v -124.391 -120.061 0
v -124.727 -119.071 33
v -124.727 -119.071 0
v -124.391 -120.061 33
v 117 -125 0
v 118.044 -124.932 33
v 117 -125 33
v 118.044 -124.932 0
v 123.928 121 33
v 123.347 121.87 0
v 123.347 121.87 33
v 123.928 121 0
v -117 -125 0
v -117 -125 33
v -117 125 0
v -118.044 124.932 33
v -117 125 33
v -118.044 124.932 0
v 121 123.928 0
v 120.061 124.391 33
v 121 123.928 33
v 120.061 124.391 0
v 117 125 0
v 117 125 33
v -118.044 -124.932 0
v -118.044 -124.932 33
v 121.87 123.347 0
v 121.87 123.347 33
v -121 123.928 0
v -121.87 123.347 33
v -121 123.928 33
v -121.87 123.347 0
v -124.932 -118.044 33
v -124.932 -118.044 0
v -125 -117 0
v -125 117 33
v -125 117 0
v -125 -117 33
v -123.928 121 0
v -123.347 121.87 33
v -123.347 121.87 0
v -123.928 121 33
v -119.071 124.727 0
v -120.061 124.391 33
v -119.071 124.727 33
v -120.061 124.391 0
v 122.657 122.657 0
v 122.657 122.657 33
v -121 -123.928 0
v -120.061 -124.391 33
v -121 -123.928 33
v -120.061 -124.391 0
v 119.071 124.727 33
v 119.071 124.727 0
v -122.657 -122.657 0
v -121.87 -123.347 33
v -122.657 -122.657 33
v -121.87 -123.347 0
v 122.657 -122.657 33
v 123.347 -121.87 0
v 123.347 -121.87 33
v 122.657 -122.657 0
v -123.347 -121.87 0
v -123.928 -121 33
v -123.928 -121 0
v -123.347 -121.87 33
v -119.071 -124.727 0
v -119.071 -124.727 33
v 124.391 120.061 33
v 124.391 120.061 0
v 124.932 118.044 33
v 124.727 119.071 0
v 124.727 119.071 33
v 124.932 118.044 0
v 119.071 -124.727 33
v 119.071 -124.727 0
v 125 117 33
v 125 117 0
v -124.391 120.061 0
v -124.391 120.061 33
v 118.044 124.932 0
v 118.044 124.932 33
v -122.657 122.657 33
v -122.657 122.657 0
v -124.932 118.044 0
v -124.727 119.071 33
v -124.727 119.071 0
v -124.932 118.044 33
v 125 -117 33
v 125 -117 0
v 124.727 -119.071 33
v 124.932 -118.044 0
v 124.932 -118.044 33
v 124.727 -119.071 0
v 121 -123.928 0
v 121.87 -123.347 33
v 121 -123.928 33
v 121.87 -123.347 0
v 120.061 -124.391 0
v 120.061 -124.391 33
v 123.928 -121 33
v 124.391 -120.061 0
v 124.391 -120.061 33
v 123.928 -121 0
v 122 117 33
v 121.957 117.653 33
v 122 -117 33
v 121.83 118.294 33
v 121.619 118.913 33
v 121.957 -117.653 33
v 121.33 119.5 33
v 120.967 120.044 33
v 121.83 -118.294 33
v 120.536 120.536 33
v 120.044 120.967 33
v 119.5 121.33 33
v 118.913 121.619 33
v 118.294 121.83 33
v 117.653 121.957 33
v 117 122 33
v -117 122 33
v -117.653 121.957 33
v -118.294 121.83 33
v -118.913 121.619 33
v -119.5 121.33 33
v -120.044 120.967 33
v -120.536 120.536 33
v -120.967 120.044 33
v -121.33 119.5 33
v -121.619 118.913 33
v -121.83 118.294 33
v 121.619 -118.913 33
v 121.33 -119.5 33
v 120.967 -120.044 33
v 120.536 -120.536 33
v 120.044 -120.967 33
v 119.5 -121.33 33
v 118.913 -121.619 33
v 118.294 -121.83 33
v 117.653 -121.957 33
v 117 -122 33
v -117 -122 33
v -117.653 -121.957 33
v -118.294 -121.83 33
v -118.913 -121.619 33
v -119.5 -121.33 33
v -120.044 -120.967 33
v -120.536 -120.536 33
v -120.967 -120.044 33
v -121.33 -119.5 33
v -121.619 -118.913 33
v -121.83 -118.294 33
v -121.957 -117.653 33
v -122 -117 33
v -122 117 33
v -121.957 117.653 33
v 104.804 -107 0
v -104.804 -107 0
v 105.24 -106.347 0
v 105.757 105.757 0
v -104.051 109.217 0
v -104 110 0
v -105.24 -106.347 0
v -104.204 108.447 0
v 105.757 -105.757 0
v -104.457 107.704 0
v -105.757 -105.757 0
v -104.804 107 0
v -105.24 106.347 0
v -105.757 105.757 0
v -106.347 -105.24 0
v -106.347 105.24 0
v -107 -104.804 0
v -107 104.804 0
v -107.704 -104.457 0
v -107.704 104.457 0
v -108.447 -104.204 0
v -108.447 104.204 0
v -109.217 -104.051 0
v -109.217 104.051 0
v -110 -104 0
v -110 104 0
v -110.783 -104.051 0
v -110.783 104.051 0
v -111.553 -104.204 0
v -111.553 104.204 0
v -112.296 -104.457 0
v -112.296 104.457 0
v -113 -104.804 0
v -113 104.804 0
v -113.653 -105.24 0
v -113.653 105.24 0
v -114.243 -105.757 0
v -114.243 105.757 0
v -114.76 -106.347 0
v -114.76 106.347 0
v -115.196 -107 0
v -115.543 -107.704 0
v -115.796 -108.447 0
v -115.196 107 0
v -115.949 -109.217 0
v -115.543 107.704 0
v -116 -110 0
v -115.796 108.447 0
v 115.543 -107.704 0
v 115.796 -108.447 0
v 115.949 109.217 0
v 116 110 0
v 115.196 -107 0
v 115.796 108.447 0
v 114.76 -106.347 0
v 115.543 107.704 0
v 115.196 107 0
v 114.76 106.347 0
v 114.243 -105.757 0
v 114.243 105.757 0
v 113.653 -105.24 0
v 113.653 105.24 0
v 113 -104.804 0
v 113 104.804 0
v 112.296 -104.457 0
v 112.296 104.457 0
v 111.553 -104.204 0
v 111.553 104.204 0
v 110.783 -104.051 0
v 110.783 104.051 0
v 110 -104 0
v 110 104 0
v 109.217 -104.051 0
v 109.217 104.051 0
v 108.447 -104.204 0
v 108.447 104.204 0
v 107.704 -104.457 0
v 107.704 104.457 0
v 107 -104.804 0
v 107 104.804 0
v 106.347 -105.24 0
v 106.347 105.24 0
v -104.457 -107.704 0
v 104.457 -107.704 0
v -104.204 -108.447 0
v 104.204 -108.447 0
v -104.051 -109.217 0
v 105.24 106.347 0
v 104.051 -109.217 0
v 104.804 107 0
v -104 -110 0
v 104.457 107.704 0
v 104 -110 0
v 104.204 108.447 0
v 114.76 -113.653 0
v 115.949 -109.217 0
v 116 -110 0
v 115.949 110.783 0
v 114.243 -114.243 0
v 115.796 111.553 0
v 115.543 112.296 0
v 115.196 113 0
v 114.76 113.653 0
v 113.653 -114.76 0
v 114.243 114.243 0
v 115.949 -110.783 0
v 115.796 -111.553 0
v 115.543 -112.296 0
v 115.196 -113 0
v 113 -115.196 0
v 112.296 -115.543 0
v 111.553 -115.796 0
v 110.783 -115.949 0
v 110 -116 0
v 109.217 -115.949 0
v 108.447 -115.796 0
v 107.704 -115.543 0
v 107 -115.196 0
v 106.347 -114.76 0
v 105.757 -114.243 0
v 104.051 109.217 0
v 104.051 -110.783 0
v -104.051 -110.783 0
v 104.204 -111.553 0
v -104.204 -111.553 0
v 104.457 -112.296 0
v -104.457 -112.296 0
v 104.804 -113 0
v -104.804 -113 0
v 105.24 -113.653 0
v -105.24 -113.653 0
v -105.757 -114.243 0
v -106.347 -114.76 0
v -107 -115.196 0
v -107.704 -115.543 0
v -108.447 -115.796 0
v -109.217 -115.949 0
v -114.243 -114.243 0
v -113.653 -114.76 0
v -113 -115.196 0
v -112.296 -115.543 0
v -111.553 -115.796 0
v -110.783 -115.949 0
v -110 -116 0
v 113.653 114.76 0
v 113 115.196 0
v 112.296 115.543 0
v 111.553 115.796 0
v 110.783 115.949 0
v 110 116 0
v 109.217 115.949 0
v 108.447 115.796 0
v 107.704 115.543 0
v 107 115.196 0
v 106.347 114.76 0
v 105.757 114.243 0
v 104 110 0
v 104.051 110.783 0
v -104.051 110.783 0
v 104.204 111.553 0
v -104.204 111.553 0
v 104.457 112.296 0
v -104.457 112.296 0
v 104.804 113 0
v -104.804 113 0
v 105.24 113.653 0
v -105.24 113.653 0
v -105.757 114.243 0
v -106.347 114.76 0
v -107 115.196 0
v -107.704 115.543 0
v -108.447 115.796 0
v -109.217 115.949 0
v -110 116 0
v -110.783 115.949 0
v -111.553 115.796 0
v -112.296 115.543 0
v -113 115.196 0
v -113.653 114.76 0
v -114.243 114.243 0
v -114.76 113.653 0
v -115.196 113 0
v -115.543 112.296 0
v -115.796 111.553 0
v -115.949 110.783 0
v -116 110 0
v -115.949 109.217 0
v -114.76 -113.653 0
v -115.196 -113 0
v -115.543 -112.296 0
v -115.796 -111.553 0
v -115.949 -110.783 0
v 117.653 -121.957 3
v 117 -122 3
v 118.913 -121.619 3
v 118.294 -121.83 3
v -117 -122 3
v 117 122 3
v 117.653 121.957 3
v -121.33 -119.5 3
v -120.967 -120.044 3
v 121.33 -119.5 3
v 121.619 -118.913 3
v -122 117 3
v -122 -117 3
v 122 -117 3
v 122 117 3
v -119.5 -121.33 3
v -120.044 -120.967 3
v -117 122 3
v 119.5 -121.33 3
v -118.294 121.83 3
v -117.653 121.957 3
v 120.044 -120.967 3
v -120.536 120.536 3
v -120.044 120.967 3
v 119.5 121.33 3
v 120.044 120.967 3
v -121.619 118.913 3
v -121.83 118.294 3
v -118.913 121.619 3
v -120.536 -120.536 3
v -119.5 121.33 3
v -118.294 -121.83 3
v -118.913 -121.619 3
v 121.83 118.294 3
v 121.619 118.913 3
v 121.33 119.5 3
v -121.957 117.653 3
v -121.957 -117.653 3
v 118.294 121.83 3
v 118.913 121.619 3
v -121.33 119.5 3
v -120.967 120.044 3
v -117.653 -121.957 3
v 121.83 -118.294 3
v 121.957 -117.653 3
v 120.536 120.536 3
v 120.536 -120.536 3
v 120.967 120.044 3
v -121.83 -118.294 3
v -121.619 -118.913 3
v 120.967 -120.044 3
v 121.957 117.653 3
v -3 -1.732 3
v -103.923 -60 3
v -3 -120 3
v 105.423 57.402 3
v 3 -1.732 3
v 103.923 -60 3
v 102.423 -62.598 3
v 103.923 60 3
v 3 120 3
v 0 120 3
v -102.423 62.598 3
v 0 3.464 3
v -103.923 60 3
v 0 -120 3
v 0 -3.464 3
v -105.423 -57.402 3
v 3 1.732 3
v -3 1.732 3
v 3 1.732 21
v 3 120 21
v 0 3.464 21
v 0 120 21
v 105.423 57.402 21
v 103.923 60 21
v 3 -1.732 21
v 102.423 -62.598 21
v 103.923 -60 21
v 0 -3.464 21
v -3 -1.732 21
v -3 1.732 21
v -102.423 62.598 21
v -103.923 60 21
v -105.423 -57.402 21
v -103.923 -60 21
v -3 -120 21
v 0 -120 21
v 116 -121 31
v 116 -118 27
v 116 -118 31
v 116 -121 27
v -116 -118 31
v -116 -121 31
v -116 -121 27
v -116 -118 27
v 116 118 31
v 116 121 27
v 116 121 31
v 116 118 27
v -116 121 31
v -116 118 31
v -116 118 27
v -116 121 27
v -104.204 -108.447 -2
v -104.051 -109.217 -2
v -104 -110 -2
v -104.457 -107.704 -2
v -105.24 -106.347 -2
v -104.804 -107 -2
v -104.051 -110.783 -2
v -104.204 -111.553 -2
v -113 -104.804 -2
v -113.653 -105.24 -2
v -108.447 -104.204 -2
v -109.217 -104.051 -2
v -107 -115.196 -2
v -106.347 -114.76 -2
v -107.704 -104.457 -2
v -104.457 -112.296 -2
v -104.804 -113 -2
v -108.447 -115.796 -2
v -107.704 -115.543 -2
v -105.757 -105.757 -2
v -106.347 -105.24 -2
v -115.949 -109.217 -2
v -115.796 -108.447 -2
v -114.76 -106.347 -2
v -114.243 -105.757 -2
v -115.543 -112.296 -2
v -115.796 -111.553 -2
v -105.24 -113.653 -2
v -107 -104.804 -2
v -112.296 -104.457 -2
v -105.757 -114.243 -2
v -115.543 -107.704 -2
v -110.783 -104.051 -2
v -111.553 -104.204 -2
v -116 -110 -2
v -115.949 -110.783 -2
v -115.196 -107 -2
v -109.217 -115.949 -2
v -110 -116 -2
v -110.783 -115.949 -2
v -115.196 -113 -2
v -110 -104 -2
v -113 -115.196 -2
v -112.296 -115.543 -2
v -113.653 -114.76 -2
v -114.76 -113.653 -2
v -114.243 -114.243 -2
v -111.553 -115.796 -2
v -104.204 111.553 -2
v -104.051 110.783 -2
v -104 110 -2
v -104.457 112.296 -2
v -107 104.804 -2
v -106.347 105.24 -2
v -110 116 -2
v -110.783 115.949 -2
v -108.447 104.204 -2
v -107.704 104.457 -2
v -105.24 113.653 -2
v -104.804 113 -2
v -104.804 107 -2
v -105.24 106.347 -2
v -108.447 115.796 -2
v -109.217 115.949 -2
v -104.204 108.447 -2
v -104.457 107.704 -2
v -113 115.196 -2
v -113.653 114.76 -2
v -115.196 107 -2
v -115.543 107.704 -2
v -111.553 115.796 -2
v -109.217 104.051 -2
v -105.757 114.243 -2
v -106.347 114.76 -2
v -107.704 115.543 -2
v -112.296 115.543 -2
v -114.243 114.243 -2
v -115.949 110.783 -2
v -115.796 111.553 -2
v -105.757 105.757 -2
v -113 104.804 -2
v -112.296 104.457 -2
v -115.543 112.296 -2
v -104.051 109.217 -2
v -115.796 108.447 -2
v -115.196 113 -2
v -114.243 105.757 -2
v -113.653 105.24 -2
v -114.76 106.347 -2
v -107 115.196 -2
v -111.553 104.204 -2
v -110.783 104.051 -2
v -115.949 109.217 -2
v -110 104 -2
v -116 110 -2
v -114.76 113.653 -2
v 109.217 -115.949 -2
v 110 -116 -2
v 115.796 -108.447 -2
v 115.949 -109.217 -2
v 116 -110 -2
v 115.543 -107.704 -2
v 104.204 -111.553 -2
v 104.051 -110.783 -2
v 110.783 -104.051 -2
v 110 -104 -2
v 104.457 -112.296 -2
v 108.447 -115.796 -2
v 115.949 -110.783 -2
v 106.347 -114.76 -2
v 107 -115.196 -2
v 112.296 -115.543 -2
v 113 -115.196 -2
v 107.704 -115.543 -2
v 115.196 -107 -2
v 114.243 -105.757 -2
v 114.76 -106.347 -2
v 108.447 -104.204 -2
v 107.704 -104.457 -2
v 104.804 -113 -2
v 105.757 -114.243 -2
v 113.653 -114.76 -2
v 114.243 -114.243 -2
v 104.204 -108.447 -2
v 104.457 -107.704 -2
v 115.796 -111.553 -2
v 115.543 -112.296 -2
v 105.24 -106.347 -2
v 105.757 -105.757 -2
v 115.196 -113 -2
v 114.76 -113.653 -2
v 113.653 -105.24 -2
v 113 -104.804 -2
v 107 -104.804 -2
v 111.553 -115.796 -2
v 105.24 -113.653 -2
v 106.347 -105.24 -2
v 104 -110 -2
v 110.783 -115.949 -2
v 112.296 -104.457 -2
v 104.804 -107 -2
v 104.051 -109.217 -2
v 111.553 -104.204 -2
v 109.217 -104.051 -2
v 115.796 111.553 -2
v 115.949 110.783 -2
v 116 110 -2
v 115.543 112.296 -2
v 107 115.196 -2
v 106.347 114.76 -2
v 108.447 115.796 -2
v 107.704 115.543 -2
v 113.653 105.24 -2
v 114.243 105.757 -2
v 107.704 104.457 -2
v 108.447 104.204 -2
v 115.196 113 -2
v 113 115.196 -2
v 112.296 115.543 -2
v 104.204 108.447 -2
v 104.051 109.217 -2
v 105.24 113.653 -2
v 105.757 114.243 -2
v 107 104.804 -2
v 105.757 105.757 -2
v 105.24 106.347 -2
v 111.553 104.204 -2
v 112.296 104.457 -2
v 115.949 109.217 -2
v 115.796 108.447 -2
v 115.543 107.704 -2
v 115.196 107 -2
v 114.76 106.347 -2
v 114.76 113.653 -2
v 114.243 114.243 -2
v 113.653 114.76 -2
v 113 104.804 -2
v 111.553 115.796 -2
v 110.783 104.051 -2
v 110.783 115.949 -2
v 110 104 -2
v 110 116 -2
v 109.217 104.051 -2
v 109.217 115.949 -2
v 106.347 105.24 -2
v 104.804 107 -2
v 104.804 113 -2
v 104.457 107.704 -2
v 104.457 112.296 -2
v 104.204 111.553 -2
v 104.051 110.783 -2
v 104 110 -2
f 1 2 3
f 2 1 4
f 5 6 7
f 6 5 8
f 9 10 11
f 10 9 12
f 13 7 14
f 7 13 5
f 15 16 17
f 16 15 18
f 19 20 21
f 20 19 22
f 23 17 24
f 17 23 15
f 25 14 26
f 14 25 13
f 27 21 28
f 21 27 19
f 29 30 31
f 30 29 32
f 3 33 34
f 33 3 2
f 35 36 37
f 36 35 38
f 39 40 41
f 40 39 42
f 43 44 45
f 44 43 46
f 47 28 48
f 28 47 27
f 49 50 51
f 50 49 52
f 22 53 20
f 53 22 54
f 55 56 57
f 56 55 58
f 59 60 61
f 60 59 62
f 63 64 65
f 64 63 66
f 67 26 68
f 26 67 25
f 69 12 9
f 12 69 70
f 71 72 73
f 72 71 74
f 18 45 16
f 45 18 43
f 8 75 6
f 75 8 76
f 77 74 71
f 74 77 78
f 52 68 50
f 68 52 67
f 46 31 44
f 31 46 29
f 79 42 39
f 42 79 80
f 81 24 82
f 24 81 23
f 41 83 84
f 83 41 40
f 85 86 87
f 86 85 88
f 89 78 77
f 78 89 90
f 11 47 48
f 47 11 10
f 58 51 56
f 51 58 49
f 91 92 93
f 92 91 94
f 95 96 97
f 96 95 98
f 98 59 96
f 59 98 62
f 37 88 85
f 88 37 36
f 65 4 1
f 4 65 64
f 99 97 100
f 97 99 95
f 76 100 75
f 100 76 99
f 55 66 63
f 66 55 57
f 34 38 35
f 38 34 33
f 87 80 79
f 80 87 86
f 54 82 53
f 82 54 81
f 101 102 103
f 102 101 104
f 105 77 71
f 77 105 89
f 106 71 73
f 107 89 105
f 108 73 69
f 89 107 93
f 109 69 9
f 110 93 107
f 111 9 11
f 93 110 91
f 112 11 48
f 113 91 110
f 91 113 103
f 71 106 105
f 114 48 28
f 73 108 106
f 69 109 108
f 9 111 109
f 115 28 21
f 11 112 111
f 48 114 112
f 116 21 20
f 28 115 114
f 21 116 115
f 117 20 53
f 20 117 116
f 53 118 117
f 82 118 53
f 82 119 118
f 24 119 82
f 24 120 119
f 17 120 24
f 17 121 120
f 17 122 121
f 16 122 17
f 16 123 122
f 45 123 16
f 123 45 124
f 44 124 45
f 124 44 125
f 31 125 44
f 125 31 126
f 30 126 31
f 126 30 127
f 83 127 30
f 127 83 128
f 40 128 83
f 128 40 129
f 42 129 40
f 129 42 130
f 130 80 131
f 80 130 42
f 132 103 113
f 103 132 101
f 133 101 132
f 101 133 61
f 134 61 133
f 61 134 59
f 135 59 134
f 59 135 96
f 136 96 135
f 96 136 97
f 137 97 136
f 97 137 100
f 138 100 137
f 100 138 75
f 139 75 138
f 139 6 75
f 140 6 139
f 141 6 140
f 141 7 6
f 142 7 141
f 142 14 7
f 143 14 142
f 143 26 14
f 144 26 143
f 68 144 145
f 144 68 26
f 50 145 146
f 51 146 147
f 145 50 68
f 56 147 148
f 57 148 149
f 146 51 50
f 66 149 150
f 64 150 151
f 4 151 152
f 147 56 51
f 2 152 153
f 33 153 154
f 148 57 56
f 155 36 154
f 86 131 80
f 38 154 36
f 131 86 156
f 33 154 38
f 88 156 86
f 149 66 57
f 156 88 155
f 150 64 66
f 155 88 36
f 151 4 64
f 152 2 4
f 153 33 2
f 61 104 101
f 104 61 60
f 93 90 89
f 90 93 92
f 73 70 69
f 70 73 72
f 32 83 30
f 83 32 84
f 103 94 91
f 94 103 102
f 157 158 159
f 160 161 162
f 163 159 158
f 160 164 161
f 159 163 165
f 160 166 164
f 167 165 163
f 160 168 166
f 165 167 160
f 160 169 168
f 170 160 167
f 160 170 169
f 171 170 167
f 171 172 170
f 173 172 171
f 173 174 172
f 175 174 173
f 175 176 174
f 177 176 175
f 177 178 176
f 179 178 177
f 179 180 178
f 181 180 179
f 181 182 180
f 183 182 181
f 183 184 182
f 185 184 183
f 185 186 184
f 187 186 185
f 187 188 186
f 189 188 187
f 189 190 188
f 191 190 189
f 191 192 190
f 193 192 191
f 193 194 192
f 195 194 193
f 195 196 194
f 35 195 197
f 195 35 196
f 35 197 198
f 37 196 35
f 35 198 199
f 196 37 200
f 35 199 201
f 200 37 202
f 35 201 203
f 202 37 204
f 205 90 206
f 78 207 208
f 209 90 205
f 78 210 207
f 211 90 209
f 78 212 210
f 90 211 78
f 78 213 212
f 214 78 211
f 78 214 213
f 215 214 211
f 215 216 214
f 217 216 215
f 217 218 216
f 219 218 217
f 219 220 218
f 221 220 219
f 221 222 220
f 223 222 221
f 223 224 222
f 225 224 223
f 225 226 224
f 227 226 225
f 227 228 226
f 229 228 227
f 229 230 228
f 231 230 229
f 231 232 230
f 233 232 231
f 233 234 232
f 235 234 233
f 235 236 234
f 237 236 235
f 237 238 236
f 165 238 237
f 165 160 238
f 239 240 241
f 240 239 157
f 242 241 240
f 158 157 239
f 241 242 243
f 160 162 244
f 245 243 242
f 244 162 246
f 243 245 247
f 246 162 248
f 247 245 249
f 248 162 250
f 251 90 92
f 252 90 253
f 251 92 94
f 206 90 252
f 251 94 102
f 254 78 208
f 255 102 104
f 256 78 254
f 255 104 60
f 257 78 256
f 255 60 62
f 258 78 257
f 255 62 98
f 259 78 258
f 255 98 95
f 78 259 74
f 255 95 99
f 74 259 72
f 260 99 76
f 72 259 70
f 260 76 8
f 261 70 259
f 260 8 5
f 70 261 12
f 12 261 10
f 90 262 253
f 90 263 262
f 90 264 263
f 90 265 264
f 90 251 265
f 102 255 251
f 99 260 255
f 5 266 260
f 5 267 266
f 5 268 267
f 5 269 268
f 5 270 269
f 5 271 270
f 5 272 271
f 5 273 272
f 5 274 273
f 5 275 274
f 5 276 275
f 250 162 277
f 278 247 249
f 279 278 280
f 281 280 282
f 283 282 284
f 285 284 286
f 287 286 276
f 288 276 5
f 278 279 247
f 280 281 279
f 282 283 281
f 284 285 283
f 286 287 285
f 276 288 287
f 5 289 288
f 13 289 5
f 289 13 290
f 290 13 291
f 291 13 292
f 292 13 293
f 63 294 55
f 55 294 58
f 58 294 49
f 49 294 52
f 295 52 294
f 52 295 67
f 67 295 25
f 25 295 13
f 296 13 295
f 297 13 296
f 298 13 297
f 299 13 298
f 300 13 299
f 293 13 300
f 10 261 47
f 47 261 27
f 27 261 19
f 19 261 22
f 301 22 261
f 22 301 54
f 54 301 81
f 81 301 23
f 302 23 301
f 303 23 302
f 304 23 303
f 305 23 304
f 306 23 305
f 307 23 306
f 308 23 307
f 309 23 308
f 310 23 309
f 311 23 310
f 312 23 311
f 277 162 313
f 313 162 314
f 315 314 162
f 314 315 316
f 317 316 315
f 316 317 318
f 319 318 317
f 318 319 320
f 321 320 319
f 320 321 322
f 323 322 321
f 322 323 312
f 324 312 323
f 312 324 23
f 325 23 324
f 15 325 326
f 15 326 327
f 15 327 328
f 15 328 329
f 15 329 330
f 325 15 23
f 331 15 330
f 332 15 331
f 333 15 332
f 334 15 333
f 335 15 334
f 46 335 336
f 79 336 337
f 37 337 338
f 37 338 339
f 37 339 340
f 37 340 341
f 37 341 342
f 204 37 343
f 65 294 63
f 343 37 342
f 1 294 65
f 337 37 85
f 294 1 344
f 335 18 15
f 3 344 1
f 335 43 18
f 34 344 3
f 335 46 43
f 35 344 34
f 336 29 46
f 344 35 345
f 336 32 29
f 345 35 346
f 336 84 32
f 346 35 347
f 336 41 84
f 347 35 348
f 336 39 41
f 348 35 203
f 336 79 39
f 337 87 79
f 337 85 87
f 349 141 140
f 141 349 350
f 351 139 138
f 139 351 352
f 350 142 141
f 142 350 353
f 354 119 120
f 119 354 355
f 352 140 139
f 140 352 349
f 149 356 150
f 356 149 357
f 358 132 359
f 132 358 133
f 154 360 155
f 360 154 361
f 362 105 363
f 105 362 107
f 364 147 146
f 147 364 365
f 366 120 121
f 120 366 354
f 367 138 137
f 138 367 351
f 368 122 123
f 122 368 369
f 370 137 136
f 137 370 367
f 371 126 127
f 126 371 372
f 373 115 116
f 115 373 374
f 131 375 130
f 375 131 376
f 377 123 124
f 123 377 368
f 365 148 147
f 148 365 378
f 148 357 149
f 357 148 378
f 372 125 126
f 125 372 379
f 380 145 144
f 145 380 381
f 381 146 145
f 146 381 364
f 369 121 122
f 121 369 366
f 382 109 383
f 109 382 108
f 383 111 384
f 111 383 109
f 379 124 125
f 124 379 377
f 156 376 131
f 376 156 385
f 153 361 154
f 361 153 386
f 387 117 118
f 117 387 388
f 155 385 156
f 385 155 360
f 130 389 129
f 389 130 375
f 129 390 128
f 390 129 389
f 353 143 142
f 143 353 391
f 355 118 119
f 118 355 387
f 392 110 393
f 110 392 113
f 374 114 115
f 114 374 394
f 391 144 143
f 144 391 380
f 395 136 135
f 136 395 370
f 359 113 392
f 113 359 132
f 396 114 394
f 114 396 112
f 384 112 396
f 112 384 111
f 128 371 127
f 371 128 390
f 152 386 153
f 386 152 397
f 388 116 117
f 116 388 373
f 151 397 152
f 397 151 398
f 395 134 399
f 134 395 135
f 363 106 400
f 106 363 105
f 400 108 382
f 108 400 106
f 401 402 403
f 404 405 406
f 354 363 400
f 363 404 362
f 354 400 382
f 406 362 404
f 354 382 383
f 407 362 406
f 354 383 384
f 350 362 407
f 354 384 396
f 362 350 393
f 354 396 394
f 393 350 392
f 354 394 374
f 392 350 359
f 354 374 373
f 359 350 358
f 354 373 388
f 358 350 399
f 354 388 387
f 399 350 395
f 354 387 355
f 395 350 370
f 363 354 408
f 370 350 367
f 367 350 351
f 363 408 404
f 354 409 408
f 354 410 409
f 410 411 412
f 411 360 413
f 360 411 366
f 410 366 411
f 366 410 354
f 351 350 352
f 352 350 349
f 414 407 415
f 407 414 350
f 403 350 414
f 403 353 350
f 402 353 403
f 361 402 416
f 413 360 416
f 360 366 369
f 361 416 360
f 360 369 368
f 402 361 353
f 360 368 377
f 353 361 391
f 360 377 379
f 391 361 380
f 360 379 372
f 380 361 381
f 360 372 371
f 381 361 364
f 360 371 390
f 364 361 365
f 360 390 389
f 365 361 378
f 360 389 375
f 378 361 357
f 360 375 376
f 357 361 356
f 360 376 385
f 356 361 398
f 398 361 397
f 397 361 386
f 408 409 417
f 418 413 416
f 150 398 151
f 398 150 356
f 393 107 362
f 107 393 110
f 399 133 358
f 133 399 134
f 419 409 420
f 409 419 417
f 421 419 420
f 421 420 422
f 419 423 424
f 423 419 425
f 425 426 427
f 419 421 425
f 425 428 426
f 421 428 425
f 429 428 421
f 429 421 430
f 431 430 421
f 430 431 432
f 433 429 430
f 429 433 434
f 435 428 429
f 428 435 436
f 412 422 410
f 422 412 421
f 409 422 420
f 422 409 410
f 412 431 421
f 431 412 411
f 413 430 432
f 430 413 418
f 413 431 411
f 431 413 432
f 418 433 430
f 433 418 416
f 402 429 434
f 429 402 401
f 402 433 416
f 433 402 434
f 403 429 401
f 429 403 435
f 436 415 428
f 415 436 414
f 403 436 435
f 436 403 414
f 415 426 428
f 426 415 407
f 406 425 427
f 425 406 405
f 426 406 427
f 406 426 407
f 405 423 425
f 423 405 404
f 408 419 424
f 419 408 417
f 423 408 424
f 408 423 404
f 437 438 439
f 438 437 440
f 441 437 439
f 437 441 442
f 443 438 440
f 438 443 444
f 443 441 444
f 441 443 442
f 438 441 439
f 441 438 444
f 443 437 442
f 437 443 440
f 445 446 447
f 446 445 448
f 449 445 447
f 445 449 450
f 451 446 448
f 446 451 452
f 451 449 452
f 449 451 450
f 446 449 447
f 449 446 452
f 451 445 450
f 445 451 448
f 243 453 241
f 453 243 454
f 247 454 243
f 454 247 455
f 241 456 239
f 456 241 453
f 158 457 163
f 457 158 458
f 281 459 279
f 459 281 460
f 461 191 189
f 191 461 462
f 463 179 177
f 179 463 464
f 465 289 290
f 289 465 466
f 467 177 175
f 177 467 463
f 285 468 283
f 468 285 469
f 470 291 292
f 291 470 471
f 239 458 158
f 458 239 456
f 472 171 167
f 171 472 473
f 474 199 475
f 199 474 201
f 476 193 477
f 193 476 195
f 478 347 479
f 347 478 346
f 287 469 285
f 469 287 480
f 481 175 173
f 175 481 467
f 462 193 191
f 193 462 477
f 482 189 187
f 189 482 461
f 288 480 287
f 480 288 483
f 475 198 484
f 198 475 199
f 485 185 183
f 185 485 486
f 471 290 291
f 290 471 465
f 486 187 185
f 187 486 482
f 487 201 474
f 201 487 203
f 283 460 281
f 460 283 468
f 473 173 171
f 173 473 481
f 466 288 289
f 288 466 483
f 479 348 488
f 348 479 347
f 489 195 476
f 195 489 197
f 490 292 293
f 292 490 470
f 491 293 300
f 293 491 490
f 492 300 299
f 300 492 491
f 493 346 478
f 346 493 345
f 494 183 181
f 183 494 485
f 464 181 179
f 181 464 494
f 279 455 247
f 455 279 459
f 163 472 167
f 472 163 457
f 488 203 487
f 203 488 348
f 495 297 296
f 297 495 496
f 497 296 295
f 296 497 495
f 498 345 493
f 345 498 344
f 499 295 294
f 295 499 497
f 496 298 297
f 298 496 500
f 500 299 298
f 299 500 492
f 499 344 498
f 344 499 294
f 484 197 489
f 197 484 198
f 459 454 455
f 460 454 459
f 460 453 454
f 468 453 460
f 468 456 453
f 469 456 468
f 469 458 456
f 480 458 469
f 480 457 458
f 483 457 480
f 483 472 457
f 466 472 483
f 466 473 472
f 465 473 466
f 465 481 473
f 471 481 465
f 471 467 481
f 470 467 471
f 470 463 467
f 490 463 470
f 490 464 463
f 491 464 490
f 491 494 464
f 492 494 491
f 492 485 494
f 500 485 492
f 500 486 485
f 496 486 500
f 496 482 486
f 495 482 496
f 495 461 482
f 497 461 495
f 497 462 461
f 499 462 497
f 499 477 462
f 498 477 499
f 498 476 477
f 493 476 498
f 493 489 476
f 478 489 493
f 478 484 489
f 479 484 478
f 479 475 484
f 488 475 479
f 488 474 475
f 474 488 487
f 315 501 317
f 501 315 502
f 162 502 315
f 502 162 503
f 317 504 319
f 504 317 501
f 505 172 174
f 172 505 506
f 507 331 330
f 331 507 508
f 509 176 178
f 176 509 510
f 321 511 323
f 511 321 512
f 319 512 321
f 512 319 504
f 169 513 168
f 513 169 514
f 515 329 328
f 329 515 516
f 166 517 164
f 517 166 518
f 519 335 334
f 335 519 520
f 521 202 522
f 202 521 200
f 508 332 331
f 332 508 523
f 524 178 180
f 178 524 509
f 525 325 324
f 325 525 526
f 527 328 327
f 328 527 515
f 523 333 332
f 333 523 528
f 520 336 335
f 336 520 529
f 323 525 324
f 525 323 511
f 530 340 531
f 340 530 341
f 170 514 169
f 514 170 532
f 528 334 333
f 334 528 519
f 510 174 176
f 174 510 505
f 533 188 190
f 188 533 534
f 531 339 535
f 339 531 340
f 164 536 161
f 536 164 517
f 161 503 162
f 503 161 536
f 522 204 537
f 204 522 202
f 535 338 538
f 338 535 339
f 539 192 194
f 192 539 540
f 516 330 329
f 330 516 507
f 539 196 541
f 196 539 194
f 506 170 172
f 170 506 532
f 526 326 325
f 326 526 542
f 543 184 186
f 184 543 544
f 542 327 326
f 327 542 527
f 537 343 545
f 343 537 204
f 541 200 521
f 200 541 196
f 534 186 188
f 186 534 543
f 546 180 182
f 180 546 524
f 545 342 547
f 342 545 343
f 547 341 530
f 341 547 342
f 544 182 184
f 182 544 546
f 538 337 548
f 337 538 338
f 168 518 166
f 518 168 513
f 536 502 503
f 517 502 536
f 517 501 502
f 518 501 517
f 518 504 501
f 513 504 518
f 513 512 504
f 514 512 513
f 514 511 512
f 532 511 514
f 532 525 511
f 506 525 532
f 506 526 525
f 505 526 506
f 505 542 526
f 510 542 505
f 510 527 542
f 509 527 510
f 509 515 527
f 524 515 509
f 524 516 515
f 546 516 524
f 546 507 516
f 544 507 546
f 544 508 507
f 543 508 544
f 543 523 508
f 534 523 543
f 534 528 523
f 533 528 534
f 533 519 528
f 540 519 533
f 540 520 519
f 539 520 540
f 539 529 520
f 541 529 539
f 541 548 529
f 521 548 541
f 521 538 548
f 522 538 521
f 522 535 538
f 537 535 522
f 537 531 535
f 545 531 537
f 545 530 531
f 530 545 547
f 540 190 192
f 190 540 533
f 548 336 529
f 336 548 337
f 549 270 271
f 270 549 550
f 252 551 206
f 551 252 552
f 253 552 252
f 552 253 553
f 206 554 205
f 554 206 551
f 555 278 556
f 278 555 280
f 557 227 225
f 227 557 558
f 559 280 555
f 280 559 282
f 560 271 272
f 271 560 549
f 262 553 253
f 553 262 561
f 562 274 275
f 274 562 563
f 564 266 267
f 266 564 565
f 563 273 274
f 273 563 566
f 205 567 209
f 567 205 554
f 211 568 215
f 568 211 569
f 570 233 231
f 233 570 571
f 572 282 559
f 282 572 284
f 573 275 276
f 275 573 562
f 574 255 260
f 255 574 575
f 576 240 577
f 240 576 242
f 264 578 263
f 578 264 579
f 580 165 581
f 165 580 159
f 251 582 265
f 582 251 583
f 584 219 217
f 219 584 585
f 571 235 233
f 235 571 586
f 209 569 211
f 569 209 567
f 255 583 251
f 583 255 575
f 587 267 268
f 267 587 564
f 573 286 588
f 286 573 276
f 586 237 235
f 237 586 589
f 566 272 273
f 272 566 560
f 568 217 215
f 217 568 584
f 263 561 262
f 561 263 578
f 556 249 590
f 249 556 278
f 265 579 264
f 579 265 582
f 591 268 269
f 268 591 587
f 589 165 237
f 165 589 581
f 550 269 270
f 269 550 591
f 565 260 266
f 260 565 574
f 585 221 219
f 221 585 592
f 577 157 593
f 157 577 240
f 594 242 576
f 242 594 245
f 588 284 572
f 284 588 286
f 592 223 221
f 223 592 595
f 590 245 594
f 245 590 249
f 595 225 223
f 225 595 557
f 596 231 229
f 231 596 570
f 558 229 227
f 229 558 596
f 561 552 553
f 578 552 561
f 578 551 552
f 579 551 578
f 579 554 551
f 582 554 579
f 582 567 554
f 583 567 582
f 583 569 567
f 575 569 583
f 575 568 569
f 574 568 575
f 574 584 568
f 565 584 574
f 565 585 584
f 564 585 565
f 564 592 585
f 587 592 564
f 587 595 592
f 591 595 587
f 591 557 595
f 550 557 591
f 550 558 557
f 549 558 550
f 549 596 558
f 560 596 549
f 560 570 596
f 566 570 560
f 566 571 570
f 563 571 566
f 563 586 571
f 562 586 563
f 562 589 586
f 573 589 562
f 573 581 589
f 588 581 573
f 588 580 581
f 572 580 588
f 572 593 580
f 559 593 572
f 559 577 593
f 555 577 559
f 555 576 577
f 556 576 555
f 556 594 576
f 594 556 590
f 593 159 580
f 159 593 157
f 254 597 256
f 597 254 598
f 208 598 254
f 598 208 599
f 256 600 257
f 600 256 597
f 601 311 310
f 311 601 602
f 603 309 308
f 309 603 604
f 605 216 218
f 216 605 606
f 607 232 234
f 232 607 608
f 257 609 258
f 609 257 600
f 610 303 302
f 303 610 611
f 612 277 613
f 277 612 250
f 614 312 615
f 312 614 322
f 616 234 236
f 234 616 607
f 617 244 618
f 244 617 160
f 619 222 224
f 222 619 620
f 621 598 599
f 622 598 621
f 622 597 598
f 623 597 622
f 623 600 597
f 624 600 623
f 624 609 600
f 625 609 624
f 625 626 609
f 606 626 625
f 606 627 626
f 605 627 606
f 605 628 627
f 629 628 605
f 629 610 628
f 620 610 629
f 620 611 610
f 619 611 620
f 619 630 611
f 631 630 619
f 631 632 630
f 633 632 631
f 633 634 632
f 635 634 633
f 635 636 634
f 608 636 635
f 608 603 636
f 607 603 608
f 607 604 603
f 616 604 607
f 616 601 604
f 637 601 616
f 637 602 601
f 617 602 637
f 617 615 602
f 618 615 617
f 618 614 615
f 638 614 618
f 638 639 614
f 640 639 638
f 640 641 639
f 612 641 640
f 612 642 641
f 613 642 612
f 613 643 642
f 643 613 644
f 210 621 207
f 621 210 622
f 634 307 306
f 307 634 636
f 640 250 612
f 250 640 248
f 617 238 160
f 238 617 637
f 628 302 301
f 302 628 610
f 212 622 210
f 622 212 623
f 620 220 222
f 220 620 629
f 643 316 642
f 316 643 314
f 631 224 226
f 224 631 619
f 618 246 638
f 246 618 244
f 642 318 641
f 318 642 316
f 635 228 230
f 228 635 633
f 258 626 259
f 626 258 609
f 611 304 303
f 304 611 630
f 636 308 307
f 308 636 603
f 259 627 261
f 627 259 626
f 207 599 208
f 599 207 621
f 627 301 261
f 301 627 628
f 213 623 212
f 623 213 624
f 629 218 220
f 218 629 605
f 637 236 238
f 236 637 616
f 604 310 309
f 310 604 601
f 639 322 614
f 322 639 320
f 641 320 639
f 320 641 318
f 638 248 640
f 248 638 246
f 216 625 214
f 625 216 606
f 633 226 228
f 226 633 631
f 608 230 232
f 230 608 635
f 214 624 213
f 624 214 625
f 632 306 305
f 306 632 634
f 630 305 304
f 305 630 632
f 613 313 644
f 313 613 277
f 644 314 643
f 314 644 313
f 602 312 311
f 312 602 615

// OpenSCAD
// Modular Pet Puzzle Feeder with Swappable Difficulty Inserts
// Pipeline Cycle 6 — 2026-03-16
// 4 difficulty levels: sliding panel, rotating disc, maze gates, combination
// Base tray with universal insert slot system

/* [Dog Size Preset] */
dog_size = "Standard"; // ["Standard", "Puppy", "Large", "Custom"]

/* [Custom Dimensions (only used when dog_size = Custom)] */
custom_base_width = 250;    // mm
custom_base_depth = 250;    // mm
custom_compartment_depth = 30; // mm — depth of treat compartments

/* [Base Configuration] */
num_compartments = 6;       // [4:1:9] Number of treat compartments
compartment_clearance = 1.0; // mm — clearance for insert sliding

/* [Insert Selection] */
// Which insert to render (or render base only)
render_part = "base"; // ["base", "level1_slider", "level2_rotator", "level3_maze", "level4_combo", "all_inserts"]

/* [Structural] */
wall_thickness = 3.0;       // mm — thicker for pet durability
base_thickness = 3.0;       // mm — strong base for pawing/nosing
insert_thickness = 2.5;     // mm
corner_radius = 8.0;        // mm — rounded corners for safety
insert_rail_height = 4.0;   // mm — height of the rail guides
insert_rail_width = 3.0;    // mm — width of rail channel

/* [Advanced] */
$fn = 48;

// ============================================================
// Dog Size Database
// ============================================================

// Dimensions: [base_width, base_depth, compartment_depth, compartment_width]
function size_dims(size) =
    size == "Puppy"    ? [180, 180, 22, 45] :
    size == "Standard" ? [250, 250, 30, 60] :
    size == "Large"    ? [320, 320, 38, 75] :
    // Custom
    [custom_base_width, custom_base_depth, custom_compartment_depth, custom_base_width / num_compartments - wall_thickness];

_dims = size_dims(dog_size);
_base_w = _dims[0];
_base_d = _dims[1];
_comp_depth = _dims[2];
_comp_w = _dims[3];

// Insert slot dimensions
_insert_w = _base_w - wall_thickness * 2 - compartment_clearance * 2;
_insert_d = _base_d - wall_thickness * 2 - compartment_clearance * 2;

// ============================================================
// Info Echo
// ============================================================

echo("=== Modular Pet Puzzle Feeder Configuration ===");
echo(str("Dog size: ", dog_size));
echo(str("Base: ", _base_w, "x", _base_d, "mm"));
echo(str("Compartments: ", num_compartments));
echo(str("Compartment depth: ", _comp_depth, "mm"));
echo(str("Insert area: ", _insert_w, "x", _insert_d, "mm"));
echo(str("Rendering: ", render_part));

// ============================================================
// Helper Modules
// ============================================================

// Rounded rectangle (2D profile)
module rounded_rect_2d(w, d, r) {
    offset(r) offset(-r) square([w, d], center = true);
}

// Rounded box
module rounded_box(w, d, h, r) {
    linear_extrude(h)
        rounded_rect_2d(w, d, r);
}

// ============================================================
// Base Tray
// ============================================================

module base_tray() {
    difference() {
        // Outer shell — rounded rectangle
        rounded_box(_base_w, _base_d, _comp_depth + base_thickness, corner_radius);

        // Inner cavity — where treats go and inserts sit
        translate([0, 0, base_thickness])
            rounded_box(
                _base_w - wall_thickness * 2,
                _base_d - wall_thickness * 2,
                _comp_depth + 1,
                corner_radius - wall_thickness
            );
    }

    // Compartment dividers — radial pattern from center
    for (i = [0 : num_compartments - 1]) {
        angle = i * (360 / num_compartments);
        rotate([0, 0, angle])
            translate([0, 0, base_thickness])
                cube([wall_thickness, _base_w / 2 - wall_thickness - 2, _comp_depth * 0.6], center = false);
    }

    // Insert rail guides — two parallel rails along the long axis
    // These guide the insert panels into position
    _rail_y = _base_d / 2 - wall_thickness - insert_rail_width / 2 - 1;
    for (side = [-1, 1]) {
        translate([0, side * _rail_y, base_thickness + _comp_depth - insert_rail_height])
            cube([_insert_w - 10, insert_rail_width, insert_rail_height], center = true);
    }

    // Anti-slip feet — small bumps on the bottom
    for (x = [-1, 1], y = [-1, 1]) {
        translate([x * (_base_w / 2 - 15), y * (_base_d / 2 - 15), -2])
            cylinder(d = 12, h = 2);
    }
}

// ============================================================
// Level 1 — Sliding Panel Insert
// ============================================================
// Simple sliding covers over compartments. Dog noses/paws the panel
// to slide it and reveal treats underneath.

module level1_slider() {
    // Main panel that slides across the base
    _panel_w = _insert_w * 0.48; // Each panel covers half the base
    _panel_d = _insert_d - 4;

    for (half = [0, 1]) {
        translate([half * (_panel_w + 4) - _insert_w / 2 + 2, 0, 0]) {
            difference() {
                // Panel body
                cube([_panel_w, _panel_d, insert_thickness], center = true);

                // Finger/nose holes for gripping
                for (i = [-1, 0, 1]) {
                    translate([i * (_panel_w / 3), 0, 0])
                        cylinder(d = 15, h = insert_thickness + 1, center = true);
                }
            }

            // Rail runners on the edges
            for (side = [-1, 1]) {
                translate([0, side * (_panel_d / 2 - insert_rail_width / 2), insert_thickness / 2])
                    cube([_panel_w - 4, insert_rail_width - compartment_clearance, insert_rail_height - 0.5], center = true);
            }
        }
    }
}

// ============================================================
// Level 2 — Rotating Disc Insert
// ============================================================
// A disc that rotates on a center post. Treat holes in the disc
// align with compartments only at certain rotations.

module level2_rotator() {
    _disc_dia = min(_insert_w, _insert_d) - 10;

    // Rotating disc
    difference() {
        cylinder(d = _disc_dia, h = insert_thickness);

        // Center pivot hole
        translate([0, 0, -0.5])
            cylinder(d = 8, h = insert_thickness + 1);

        // Treat access holes — offset from center
        for (i = [0 : num_compartments - 1]) {
            angle = i * (360 / num_compartments) + 15; // Offset so not aligned by default
            translate([cos(angle) * _disc_dia * 0.3, sin(angle) * _disc_dia * 0.3, -0.5])
                cylinder(d = 20, h = insert_thickness + 1);
        }

        // Nose push tab cutout
        translate([_disc_dia / 2 - 15, 0, -0.5])
            cylinder(d = 12, h = insert_thickness + 1);
    }

    // Center post (prints with the disc, inserts into base center)
    translate([0, 0, -8])
        cylinder(d = 7.5, h = 8);

    // Locking tabs — small bumps that click into notches at correct alignment
    for (i = [0 : 3]) {
        angle = i * 90;
        translate([cos(angle) * (_disc_dia / 2 - 5), sin(angle) * (_disc_dia / 2 - 5), insert_thickness])
            sphere(d = 3);
    }
}

// ============================================================
// Level 3 — Sequential Maze Insert
// ============================================================
// Sliding gates in sequence. Must open gate A before gate B is accessible.
// Creates a maze path to the treats.

module level3_maze() {
    _maze_w = _insert_w - 8;
    _maze_d = _insert_d - 8;
    _gate_w = _maze_w / 3;
    _channel_w = 18; // Width of the sliding channel

    // Base frame
    difference() {
        cube([_maze_w, _maze_d, insert_thickness * 1.5], center = true);

        // Three sliding gate channels
        for (i = [-1, 0, 1]) {
            translate([i * _gate_w, 0, 0])
                cube([_channel_w, _maze_d - 10, insert_thickness * 1.5 + 1], center = true);
        }

        // Treat access holes between gates
        for (i = [0, 1]) {
            translate([(i - 0.5) * _gate_w, 0, 0])
                cube([_gate_w - _channel_w - 4, _maze_d - 20, insert_thickness * 1.5 + 1], center = true);
        }
    }

    // Sliding gates (3 separate pieces)
    for (i = [-1, 0, 1]) {
        translate([i * _gate_w, _maze_d / 2 + 15, 0]) {
            difference() {
                cube([_channel_w - compartment_clearance * 2, _maze_d - 12, insert_thickness], center = true);

                // Nose hole
                cylinder(d = 12, h = insert_thickness + 1, center = true);
            }
        }
    }
}

// ============================================================
// Level 4 — Multi-Step Combination Insert
// ============================================================
// Combines sliding, rotating, and lifting. The hardest level.
// A rotating disc sits above sliding panels with locking pegs.

module level4_combo() {
    _combo_w = _insert_w - 8;
    _combo_d = _insert_d - 8;

    // Bottom layer — sliding panel (like Level 1 but with peg holes)
    difference() {
        cube([_combo_w, _combo_d * 0.45, insert_thickness], center = true);

        // Peg holes that lock the rotating top
        for (x = [-1, 1]) {
            translate([x * (_combo_w / 4), 0, 0])
                cylinder(d = 6, h = insert_thickness + 1, center = true);
        }

        // Nose grip
        cylinder(d = 15, h = insert_thickness + 1, center = true);
    }

    // Top layer — small rotating disc with locking pegs
    translate([0, 0, insert_thickness + 2]) {
        difference() {
            cylinder(d = _combo_w * 0.6, h = insert_thickness);

            // Center pivot
            translate([0, 0, -0.5])
                cylinder(d = 8, h = insert_thickness + 1);

            // Treat holes
            for (i = [0 : 3]) {
                angle = i * 90 + 22.5;
                translate([cos(angle) * _combo_w * 0.2, sin(angle) * _combo_w * 0.2, -0.5])
                    cylinder(d = 18, h = insert_thickness + 1);
            }
        }

        // Locking pegs (must be pulled before disc rotates)
        for (x = [-1, 1]) {
            translate([x * (_combo_w / 4), 0, insert_thickness])
                cylinder(d = 5.5, h = 6);
        }
    }
}

// ============================================================
// Render Selection
// ============================================================

if (render_part == "base") {
    base_tray();
} else if (render_part == "level1_slider") {
    level1_slider();
} else if (render_part == "level2_rotator") {
    level2_rotator();
} else if (render_part == "level3_maze") {
    level3_maze();
} else if (render_part == "level4_combo") {
    level4_combo();
} else if (render_part == "all_inserts") {
    // Layout all inserts for display
    translate([-_base_w * 0.6, 0, 0]) level1_slider();
    translate([0, 0, 0]) level2_rotator();
    translate([_base_w * 0.6, 0, 0]) level3_maze();
    translate([0, _base_d * 0.6, 0]) level4_combo();
}

// ============================================================
// Print Notes
// ============================================================
// BASE TRAY:
//   Print upright (as oriented). No supports needed.
//   PETG required for food safety (apply food-safe epoxy after printing).
//   30% infill for durability against pawing/nosing.
//   ~80g, ~2.5 hours for Standard size.
//
// LEVEL 1 (Sliding Panels):
//   Print flat. No supports. 2 panels per set.
//   ~20g total, ~40 minutes.
//
// LEVEL 2 (Rotating Disc):
//   Print flat, disc side up. Center post prints downward (flip for printing).
//   ~25g, ~50 minutes.
//
// LEVEL 3 (Maze + Gates):
//   Print frame flat. Print 3 gates separately.
//   ~30g total, ~1 hour.
//
// LEVEL 4 (Combination):
//   Print bottom panel flat. Print top disc flat. Print pegs with disc.
//   ~25g, ~50 minutes.
//
// FOOD SAFETY:
//   After printing, sand surfaces smooth (220 grit).
//   Apply 2 coats food-safe epoxy (ArtResin or equivalent).
//   Allow 72-hour cure before use.
//   Hand wash only — no dishwasher.
